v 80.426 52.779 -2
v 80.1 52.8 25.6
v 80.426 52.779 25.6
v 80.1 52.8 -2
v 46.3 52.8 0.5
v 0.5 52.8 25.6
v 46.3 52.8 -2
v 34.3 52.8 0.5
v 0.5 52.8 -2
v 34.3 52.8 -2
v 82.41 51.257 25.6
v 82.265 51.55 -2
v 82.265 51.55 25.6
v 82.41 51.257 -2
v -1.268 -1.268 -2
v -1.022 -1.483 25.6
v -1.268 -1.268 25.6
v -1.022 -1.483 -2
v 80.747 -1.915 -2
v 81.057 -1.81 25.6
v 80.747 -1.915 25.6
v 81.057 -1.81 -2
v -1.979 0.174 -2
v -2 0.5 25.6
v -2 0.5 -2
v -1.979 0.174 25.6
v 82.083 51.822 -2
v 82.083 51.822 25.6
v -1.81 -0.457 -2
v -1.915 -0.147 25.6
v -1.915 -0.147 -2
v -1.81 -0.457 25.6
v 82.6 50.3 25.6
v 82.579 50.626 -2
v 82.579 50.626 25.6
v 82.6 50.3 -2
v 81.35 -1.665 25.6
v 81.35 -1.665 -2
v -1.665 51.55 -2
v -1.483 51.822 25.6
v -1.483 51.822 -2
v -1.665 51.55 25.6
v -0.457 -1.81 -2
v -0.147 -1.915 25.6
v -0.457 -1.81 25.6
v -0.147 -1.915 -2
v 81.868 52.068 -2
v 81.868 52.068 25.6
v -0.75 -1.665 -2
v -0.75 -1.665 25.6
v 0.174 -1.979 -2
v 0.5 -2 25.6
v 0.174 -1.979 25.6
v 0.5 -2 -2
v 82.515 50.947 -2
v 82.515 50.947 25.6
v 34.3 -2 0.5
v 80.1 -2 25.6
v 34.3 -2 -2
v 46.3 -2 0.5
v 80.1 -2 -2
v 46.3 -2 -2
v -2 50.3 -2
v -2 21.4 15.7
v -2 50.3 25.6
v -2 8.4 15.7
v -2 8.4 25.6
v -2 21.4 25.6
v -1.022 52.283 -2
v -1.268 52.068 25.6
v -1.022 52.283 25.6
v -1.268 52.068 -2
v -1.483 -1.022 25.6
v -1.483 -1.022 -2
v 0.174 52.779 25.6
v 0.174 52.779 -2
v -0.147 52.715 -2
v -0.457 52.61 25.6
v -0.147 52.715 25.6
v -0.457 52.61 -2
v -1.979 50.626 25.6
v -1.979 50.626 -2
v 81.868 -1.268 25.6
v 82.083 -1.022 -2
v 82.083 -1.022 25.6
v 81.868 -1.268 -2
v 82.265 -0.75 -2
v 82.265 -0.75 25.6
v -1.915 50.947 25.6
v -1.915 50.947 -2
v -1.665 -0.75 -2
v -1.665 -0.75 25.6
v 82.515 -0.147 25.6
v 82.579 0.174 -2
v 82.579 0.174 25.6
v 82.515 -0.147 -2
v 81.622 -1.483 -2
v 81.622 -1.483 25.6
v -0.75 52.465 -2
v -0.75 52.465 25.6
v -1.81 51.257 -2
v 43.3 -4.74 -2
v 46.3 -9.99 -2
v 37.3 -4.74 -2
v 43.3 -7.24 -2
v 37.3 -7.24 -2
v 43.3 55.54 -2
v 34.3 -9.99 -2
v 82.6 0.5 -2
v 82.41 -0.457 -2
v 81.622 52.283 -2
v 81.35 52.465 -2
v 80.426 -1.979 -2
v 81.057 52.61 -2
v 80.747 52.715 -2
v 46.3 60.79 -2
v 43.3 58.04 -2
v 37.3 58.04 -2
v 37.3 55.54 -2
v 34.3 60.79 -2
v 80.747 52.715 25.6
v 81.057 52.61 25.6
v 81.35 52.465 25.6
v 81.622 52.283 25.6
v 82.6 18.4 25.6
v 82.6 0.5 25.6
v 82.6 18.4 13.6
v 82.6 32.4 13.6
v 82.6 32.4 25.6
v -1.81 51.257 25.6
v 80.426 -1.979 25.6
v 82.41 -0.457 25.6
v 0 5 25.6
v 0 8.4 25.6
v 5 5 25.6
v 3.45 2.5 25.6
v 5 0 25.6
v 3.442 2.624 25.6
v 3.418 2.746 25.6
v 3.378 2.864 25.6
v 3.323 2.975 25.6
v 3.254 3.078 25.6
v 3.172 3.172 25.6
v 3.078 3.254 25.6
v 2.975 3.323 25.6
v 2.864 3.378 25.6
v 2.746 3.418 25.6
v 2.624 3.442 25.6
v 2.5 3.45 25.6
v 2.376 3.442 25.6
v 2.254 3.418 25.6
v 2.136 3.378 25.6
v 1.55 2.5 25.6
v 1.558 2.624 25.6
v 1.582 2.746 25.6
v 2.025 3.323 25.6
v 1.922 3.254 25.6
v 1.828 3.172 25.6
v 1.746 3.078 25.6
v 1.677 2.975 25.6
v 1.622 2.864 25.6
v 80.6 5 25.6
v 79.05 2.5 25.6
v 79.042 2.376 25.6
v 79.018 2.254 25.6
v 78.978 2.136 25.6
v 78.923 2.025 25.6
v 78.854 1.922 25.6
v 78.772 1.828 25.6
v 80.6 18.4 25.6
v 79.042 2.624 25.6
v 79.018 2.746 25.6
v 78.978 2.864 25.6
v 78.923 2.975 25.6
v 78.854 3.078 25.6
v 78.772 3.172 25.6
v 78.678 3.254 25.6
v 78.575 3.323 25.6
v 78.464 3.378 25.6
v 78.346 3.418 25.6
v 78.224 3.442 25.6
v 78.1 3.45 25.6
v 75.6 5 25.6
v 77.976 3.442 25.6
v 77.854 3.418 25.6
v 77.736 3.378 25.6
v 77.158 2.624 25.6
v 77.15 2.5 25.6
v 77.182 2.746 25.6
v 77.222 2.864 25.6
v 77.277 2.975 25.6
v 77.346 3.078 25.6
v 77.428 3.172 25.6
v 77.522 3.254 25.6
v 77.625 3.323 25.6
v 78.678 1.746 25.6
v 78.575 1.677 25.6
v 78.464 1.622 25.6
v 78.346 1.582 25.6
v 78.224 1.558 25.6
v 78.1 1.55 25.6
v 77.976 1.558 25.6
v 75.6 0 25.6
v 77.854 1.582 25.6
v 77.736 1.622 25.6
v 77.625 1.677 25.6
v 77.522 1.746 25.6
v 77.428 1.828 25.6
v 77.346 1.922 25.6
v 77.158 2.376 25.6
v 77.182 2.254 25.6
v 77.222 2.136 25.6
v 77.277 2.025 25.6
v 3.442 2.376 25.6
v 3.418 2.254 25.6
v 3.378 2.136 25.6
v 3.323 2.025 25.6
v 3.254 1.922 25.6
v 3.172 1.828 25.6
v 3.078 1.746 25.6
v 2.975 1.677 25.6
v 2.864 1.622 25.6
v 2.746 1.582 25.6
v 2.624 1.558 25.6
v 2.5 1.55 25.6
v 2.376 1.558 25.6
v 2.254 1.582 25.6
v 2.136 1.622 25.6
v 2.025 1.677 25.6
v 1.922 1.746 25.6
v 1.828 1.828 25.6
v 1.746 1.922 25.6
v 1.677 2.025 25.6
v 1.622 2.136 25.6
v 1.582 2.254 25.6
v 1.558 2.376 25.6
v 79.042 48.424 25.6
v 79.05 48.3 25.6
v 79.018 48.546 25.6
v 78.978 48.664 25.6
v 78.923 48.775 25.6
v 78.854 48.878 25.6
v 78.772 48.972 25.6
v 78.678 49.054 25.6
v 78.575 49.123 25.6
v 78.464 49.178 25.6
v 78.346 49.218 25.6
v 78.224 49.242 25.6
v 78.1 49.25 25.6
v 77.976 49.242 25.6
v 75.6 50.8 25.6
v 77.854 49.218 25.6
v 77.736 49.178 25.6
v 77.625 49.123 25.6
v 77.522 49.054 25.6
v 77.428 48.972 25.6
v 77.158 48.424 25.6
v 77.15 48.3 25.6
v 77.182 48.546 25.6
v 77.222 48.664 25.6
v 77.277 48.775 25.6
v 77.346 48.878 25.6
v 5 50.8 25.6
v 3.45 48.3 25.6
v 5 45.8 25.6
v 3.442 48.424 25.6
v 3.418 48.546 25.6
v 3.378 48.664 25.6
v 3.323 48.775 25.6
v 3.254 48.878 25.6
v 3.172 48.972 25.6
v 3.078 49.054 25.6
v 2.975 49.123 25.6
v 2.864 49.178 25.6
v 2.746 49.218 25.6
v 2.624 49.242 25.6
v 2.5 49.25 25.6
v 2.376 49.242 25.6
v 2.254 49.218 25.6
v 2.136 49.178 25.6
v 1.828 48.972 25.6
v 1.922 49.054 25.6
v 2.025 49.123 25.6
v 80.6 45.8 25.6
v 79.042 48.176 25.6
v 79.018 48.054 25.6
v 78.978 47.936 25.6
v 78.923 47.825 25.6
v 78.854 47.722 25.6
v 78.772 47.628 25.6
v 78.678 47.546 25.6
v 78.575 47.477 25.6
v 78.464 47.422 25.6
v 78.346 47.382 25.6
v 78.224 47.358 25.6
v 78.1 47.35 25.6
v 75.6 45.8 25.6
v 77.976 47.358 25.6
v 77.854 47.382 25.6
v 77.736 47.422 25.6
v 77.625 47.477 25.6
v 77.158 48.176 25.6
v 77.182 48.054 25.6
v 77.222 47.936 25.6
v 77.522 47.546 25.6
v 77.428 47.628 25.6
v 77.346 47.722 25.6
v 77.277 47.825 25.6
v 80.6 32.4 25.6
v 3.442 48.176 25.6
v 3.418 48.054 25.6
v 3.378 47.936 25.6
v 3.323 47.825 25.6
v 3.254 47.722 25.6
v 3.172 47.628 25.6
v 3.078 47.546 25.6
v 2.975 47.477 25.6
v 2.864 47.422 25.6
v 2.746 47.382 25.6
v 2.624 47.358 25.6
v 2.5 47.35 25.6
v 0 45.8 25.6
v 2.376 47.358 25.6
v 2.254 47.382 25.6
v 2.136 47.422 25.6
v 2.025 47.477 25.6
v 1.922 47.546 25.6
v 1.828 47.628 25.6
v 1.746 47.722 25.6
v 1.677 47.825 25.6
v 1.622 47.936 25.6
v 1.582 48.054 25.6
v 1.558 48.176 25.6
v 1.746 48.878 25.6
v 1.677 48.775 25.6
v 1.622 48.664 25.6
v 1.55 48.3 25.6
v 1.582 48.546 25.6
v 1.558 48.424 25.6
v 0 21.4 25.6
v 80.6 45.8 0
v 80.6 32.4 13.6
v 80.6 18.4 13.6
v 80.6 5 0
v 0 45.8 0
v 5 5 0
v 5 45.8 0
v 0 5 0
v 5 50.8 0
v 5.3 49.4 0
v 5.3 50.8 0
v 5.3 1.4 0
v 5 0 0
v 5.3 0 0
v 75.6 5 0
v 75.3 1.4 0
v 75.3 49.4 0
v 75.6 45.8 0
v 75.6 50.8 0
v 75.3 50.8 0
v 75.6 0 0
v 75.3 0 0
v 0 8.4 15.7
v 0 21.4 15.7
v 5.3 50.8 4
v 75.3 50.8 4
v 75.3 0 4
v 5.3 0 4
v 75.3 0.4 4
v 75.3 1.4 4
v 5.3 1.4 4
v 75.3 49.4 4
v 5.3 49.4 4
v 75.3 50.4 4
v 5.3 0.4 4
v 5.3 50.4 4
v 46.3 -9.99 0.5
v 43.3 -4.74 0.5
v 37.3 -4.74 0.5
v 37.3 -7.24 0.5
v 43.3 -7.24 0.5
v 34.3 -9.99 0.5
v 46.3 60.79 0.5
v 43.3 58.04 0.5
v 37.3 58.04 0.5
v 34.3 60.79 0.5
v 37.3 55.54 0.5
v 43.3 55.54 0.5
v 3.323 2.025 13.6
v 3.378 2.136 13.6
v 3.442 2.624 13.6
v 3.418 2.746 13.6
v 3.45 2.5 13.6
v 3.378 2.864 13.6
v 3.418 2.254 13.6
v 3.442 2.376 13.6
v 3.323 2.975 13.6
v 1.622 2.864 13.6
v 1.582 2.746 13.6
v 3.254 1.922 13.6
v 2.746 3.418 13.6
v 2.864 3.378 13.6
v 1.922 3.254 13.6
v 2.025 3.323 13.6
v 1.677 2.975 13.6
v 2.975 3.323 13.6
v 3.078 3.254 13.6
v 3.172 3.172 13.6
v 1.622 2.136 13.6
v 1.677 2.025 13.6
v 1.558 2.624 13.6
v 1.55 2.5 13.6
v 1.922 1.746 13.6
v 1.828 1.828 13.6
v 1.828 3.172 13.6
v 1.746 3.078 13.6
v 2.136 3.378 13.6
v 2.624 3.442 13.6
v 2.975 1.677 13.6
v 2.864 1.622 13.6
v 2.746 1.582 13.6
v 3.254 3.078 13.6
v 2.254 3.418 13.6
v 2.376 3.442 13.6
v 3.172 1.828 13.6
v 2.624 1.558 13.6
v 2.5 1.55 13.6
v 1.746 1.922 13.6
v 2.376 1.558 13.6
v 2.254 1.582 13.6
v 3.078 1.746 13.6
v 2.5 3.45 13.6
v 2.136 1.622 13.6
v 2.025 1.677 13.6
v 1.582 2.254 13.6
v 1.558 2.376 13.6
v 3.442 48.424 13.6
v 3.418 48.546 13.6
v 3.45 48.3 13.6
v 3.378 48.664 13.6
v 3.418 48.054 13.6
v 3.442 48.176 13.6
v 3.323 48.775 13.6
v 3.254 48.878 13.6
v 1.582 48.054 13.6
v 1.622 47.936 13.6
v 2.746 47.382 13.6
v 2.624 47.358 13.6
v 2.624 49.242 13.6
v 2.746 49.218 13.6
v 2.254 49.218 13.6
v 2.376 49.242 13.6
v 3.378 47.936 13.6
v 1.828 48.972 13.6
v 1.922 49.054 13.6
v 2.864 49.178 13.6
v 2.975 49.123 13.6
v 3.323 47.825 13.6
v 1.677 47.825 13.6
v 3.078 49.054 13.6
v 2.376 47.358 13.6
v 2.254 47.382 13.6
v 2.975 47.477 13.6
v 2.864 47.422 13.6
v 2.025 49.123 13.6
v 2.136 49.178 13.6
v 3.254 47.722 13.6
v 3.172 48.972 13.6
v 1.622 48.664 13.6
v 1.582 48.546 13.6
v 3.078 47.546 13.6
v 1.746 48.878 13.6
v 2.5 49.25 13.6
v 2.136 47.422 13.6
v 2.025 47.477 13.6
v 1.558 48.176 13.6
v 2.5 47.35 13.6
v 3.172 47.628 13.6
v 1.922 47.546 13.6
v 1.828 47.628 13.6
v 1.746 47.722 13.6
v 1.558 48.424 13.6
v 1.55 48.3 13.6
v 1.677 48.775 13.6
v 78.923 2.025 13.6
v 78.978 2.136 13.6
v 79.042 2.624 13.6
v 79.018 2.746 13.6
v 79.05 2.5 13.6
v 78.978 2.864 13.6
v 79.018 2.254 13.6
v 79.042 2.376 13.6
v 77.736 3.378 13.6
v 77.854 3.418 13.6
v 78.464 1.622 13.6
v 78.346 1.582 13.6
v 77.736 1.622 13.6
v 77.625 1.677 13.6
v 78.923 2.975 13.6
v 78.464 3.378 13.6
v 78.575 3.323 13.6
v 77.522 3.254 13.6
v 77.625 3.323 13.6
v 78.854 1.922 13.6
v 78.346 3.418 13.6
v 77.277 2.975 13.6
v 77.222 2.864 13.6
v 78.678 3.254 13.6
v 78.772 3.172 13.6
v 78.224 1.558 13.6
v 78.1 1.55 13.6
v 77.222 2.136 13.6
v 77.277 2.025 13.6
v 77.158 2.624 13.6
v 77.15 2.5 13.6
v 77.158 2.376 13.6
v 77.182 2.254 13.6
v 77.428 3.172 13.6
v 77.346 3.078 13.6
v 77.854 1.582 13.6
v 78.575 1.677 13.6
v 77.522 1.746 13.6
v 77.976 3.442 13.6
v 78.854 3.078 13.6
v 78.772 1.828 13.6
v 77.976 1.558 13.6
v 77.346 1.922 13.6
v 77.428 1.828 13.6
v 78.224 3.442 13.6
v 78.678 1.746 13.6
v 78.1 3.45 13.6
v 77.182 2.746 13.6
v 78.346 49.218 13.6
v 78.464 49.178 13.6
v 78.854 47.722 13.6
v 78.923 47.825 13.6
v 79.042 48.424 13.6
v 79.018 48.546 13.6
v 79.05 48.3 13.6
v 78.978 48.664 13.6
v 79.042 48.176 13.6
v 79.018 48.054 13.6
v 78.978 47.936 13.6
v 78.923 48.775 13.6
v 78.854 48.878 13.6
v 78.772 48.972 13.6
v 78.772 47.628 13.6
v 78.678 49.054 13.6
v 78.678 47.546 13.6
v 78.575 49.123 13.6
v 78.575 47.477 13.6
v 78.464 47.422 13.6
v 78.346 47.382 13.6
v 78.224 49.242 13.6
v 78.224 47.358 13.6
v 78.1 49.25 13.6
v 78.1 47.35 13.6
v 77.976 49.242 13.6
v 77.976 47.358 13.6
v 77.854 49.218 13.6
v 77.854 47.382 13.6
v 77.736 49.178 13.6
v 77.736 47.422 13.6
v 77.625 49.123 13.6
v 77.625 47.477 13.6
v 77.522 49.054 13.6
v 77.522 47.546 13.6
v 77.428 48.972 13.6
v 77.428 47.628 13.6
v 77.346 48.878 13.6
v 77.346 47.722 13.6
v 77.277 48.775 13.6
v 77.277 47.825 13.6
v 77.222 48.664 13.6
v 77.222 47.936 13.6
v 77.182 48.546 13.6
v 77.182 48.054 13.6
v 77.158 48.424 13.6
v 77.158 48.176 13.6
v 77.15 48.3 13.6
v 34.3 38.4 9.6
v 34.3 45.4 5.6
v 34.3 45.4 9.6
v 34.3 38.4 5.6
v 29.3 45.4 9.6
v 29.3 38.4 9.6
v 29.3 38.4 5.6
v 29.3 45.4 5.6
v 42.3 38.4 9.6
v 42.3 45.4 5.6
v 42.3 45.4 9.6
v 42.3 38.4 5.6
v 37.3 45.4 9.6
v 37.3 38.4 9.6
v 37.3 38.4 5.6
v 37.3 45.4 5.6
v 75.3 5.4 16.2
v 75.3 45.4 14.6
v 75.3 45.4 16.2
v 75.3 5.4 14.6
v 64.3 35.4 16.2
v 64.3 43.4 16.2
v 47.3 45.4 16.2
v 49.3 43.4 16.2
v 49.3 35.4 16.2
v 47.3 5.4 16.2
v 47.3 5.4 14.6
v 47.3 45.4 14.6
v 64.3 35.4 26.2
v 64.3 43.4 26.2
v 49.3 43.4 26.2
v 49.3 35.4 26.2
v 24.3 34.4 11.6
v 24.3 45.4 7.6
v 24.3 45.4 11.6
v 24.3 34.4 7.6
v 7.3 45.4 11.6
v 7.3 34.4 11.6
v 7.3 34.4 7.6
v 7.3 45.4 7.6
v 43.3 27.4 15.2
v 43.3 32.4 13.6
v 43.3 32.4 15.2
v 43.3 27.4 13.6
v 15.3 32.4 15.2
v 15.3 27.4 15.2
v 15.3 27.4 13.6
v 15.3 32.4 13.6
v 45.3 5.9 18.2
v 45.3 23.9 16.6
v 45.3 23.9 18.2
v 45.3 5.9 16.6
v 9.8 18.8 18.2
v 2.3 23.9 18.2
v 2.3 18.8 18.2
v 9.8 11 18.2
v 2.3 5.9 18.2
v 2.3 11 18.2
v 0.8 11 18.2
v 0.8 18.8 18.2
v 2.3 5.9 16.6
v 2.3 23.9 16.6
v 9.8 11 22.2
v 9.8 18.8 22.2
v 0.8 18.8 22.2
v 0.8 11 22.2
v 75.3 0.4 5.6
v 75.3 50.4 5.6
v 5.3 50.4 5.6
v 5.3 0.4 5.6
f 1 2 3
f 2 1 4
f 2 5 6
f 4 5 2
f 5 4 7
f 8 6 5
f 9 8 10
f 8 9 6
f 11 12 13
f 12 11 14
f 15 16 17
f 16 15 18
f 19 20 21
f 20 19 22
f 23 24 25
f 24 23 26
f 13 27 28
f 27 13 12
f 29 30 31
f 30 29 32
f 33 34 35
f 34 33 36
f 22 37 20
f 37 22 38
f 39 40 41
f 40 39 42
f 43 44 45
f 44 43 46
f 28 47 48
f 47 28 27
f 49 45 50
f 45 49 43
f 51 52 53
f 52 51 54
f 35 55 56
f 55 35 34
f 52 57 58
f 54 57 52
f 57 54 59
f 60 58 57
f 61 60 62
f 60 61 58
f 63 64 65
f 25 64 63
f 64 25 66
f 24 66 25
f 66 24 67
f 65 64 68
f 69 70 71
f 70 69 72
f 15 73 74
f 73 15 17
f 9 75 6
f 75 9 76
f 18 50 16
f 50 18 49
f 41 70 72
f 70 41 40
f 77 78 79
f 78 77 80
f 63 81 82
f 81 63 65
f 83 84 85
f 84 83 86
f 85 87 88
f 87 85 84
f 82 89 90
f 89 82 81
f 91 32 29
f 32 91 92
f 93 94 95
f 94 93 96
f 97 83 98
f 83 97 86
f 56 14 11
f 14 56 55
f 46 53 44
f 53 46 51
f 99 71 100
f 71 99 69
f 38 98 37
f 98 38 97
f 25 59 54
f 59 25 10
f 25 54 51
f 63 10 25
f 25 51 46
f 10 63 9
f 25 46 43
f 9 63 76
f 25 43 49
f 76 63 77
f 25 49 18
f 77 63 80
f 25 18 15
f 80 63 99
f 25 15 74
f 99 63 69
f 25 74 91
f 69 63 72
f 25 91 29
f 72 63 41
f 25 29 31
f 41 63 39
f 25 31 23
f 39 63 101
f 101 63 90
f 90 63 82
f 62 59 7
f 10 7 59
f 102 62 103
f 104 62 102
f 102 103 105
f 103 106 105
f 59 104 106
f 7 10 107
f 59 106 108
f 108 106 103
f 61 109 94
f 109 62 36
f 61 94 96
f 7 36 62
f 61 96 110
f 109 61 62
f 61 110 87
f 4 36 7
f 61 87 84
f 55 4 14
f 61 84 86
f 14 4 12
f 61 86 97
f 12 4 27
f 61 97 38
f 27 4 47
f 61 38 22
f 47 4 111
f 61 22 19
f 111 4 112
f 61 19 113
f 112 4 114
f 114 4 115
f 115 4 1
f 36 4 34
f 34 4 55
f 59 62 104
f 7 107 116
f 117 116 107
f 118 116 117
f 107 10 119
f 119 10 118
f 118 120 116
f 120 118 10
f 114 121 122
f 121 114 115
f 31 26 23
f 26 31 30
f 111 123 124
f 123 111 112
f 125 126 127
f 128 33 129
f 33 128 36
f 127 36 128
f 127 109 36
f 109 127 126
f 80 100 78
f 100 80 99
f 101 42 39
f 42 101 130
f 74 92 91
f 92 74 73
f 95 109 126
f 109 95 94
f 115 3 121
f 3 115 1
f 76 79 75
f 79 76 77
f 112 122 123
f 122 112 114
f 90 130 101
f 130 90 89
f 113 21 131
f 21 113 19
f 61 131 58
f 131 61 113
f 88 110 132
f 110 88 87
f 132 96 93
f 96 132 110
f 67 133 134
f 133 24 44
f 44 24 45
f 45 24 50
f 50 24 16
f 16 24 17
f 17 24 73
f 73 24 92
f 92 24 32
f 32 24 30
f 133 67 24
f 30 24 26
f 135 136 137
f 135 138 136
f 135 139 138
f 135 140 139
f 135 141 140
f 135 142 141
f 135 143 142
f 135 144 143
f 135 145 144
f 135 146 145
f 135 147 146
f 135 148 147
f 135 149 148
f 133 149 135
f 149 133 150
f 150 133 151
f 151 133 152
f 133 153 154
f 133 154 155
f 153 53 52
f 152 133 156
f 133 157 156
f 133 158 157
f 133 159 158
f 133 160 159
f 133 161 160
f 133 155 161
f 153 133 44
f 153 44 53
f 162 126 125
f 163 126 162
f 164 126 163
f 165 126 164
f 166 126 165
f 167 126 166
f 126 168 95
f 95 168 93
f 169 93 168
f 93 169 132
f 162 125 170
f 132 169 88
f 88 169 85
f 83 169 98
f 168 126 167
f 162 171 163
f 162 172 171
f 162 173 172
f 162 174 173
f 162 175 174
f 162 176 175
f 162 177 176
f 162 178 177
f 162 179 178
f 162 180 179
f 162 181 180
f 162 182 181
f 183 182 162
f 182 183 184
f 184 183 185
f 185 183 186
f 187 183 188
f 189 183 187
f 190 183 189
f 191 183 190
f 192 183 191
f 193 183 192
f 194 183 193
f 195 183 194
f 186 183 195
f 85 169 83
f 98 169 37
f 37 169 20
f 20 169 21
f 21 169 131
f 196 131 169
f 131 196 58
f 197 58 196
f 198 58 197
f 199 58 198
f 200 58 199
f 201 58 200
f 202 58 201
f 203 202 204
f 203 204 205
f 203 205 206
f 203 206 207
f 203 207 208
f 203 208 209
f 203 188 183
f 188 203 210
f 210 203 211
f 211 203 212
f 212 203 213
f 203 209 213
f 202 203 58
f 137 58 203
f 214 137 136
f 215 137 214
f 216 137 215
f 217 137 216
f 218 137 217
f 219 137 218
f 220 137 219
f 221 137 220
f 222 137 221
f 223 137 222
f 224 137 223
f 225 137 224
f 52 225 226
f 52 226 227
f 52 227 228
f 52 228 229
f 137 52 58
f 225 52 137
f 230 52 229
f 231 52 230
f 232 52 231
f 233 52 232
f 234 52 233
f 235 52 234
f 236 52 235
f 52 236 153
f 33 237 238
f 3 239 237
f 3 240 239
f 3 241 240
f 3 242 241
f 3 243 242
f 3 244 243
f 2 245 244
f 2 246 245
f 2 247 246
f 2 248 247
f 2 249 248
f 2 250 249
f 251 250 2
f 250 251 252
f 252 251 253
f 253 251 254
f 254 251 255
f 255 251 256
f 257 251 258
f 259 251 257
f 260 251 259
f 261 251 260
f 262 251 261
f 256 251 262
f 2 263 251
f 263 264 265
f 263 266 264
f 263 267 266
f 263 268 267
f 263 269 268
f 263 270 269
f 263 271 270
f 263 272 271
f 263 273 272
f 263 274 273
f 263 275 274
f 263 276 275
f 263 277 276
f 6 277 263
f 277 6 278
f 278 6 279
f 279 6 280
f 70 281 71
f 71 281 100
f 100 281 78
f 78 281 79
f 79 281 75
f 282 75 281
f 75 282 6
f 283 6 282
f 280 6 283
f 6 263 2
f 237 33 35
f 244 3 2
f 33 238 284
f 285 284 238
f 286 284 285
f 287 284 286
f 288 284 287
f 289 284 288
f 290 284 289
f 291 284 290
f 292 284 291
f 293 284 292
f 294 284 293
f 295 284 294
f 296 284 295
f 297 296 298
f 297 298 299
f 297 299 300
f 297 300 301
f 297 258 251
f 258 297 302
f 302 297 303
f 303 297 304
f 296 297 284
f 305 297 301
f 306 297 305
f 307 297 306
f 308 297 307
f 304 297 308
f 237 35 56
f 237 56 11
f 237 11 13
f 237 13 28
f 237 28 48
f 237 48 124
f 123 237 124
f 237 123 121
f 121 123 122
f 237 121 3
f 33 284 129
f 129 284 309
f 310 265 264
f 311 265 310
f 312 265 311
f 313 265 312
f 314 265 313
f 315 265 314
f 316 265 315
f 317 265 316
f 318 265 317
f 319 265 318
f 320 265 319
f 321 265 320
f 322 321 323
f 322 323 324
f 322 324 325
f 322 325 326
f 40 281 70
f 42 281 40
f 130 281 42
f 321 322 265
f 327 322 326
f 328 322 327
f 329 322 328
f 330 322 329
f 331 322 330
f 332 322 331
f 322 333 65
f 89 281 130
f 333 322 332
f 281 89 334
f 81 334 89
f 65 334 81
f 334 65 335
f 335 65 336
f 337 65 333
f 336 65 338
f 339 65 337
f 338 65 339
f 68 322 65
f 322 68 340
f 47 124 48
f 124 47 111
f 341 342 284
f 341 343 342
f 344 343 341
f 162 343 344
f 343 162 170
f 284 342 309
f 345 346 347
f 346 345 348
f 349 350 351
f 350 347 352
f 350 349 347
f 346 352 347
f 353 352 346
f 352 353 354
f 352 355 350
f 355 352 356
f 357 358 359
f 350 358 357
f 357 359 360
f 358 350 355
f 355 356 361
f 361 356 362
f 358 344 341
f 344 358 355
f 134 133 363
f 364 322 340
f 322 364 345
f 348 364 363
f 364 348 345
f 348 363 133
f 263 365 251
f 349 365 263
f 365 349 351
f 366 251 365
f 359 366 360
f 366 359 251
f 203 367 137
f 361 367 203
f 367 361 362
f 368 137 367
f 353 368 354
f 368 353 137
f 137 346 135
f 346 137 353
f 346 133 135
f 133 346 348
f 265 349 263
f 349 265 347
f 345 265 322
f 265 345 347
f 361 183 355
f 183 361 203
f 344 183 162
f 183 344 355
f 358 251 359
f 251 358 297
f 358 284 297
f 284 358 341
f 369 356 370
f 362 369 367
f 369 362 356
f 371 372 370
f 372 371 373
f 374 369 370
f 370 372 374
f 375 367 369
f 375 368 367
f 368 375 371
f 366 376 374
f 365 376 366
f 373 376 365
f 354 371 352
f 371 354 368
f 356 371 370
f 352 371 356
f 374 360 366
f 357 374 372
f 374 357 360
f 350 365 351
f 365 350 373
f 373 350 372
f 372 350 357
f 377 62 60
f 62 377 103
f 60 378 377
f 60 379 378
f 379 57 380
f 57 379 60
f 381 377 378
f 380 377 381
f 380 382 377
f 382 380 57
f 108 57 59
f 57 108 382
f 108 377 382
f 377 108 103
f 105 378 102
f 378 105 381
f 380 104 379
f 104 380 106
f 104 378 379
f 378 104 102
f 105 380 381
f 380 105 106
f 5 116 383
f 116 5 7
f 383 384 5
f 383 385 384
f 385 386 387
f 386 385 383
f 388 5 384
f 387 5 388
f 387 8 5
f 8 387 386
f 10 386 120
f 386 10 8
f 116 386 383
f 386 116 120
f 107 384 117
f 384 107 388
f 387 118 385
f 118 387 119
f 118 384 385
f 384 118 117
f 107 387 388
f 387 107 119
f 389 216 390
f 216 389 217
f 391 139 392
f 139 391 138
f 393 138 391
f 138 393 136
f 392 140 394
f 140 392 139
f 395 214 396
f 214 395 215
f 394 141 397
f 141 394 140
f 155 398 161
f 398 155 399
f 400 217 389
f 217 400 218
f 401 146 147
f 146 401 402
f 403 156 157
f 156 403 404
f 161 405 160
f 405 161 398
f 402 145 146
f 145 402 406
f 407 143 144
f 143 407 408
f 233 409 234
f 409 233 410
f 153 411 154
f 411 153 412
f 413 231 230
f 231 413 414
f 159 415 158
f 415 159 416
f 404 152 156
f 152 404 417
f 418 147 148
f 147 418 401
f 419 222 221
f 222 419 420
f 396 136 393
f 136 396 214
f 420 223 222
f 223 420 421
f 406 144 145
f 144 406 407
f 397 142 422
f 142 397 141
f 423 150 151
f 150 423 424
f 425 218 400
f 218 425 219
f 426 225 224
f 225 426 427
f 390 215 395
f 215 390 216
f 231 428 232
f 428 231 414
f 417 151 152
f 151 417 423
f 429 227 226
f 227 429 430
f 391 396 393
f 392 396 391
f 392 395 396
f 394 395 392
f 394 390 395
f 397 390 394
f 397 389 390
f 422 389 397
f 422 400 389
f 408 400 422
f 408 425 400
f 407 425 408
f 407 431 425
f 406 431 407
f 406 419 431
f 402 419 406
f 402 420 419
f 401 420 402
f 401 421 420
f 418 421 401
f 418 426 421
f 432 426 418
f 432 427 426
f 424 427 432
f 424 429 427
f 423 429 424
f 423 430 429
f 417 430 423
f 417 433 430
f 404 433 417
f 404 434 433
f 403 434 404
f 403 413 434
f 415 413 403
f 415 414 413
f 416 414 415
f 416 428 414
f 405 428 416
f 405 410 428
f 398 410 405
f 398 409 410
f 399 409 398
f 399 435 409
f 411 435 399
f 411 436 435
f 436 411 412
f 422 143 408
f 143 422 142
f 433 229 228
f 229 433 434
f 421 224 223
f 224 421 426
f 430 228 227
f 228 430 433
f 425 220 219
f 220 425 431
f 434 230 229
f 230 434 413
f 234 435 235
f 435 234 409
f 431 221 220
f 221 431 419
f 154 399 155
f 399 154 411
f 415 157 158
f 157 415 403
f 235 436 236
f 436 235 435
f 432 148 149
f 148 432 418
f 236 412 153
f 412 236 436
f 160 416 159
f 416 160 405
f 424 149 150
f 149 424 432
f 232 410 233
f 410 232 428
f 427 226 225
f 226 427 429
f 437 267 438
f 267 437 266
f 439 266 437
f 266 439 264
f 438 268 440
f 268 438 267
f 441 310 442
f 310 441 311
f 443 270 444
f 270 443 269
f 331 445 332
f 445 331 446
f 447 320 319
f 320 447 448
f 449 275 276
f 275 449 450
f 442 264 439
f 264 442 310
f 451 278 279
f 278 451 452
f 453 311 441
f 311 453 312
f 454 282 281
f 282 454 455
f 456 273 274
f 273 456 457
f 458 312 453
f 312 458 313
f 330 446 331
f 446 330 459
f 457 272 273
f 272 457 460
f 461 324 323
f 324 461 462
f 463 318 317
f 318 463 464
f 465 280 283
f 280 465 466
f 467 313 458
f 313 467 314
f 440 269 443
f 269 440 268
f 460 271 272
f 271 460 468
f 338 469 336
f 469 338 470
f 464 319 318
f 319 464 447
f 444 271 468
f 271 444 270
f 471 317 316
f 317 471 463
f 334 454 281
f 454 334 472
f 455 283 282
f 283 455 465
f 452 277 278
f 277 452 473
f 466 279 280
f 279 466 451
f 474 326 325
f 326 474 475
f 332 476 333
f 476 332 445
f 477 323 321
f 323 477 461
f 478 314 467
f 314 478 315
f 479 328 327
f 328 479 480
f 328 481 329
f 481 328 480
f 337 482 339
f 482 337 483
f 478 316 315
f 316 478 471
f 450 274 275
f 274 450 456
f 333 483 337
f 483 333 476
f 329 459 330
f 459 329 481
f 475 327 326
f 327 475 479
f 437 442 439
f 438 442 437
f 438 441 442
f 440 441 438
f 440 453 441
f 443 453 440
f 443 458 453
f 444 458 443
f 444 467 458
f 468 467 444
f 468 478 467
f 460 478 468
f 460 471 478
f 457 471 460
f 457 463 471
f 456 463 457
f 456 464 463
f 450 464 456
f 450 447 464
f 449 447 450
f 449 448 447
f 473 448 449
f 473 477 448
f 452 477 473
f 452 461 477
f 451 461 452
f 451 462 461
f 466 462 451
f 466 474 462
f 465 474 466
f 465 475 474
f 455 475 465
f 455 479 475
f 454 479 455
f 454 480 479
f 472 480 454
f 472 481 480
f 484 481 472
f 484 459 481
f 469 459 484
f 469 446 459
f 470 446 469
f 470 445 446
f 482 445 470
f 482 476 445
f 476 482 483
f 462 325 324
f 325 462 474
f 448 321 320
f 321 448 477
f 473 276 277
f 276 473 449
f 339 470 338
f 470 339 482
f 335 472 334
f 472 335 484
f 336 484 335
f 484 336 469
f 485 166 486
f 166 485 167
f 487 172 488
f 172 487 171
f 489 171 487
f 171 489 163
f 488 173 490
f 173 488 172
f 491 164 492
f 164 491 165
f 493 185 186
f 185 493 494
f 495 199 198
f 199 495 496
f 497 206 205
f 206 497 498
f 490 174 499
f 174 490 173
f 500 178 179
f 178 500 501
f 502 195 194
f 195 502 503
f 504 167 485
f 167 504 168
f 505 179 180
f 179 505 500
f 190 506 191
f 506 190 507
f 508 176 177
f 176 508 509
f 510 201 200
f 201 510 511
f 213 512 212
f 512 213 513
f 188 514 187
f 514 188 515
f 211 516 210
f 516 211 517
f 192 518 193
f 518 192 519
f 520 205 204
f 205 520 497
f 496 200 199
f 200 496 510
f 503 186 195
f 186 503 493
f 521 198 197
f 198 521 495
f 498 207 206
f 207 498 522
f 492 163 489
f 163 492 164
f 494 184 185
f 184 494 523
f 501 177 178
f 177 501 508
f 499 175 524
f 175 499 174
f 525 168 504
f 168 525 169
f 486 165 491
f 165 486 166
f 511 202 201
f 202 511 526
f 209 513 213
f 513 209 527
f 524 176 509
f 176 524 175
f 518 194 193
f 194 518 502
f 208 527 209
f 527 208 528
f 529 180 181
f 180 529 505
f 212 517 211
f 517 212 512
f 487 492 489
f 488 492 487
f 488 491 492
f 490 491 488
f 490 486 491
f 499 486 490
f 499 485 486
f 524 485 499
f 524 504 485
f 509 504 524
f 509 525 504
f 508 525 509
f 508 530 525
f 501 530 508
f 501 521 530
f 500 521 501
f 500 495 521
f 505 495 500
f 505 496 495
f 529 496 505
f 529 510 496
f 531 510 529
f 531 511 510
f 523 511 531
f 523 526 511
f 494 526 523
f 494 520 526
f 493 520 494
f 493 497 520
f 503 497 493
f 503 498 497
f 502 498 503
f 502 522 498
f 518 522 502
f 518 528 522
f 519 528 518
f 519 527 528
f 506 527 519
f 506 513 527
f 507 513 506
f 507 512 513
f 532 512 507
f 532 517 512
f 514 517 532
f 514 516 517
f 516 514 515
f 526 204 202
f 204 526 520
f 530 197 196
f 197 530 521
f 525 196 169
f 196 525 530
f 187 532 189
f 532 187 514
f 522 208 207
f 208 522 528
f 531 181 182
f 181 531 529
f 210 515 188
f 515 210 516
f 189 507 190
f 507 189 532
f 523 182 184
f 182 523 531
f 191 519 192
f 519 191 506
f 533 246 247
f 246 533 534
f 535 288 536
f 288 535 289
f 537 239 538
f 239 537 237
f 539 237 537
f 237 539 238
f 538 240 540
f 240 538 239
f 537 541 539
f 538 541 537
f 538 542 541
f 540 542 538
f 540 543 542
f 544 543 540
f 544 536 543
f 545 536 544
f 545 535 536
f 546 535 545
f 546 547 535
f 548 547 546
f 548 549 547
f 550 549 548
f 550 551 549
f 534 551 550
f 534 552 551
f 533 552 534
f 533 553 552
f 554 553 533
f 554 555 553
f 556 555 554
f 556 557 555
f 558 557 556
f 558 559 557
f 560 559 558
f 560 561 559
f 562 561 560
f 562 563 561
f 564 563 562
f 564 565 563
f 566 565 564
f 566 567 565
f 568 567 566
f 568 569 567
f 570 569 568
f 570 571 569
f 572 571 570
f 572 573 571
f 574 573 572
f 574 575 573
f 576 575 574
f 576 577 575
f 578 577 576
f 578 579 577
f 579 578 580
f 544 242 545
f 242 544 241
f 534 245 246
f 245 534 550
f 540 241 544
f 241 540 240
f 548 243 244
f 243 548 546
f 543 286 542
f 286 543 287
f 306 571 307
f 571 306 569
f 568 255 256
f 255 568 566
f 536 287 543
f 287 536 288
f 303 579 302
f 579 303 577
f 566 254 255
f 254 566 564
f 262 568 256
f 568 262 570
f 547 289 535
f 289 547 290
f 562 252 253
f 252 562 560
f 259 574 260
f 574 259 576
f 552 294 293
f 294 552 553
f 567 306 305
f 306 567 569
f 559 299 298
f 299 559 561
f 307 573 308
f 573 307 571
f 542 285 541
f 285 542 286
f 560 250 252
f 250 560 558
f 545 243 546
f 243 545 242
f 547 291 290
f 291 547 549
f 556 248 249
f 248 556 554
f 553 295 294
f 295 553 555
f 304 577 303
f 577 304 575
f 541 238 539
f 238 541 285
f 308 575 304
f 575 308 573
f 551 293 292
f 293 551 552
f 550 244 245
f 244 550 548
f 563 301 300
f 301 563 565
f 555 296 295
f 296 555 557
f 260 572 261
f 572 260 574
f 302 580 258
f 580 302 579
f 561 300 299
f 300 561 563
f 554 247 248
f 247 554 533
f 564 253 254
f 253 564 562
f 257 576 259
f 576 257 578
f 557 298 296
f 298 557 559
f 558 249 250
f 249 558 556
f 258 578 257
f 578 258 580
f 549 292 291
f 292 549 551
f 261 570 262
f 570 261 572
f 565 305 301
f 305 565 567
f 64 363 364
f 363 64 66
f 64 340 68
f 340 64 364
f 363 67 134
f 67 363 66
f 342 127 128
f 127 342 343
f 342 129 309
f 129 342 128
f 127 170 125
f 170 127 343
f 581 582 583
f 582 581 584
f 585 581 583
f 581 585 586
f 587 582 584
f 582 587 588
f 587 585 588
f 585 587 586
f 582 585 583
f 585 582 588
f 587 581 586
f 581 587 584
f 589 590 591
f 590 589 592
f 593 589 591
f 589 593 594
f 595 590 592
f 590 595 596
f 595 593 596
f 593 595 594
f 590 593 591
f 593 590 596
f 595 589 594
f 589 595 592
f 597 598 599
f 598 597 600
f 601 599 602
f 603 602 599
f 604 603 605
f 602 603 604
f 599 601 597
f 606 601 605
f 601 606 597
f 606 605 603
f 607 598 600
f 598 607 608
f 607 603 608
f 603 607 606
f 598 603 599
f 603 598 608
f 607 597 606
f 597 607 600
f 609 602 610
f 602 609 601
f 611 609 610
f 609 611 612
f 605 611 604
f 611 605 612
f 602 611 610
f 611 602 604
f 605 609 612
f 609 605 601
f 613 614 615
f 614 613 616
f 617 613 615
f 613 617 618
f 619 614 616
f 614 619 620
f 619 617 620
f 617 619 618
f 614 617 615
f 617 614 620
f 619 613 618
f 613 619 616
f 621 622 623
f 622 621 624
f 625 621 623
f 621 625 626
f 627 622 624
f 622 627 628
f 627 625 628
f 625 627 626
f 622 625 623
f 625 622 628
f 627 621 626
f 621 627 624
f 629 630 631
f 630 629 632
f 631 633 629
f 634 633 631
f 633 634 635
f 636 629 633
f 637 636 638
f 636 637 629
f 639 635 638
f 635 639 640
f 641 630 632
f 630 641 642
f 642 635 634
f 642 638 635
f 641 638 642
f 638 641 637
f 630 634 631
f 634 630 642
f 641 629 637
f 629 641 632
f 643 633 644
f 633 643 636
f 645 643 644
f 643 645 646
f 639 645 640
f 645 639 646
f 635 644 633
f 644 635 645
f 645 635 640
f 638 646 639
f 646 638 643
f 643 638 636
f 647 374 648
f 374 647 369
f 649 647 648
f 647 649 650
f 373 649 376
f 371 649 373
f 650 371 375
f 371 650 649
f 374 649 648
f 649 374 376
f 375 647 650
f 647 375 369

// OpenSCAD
// Корпус адаптера PSA-CAN, два варианта (раскладка плат — в hardware/README.md):
//   full — макетная плата 50x70 мм: Arduino Nano, MCP2515, DC-DC Mini360, оптопары, X9C104;
//   lite — макетная плата 50x48 мм (5x7, обрезанная по длине): только Arduino Nano и MCP2515.
//
// Плата лежит на полках, с торцов упирается в бобышки, сверху её прижимают стойки крышки.
// Крышка крепится четырьмя саморезами 2,2x9,5 мм (или M2.5x8) в бобышки по углам.
//
// Экспорт: openscad -D "variant=\"full\"" -D "part=\"base\"" -o base-full.stl case.scad
//          (и то же для part "lid" и variant "lite")

variant = "full";  // [full, lite]
part = "assembly"; // [assembly, base, lid]
lite = variant == "lite";

/* [Плата] */
board = lite ? [48, 50, 1.6] : [70, 50, 1.6];
board_gap = 0.4;       // зазор платы до стенок
standoff = 4;          // высота под платой (пайка)
// высота над платой: full — Nano в панельках и клеммник MCP2515; lite — модули впаяны
headroom = lite ? 16 : 20;

/* [Корпус] */
wall = 2;
floor_t = 2;
lid_t = 2;
corner_r = 2.5;
boss = 5;              // сторона квадратной бобышки под саморез
screw_pilot = 1.9;     // отверстие под саморез 2,2 мм
screw_clear = 2.6;     // отверстие в крышке
screw_head = 4.8;      // потай под головку
fit = 0.25;            // зазор посадки крышки

/* [Разъём USB Nano — торец X=0] */
usb_y = lite ? 10.5 : 14.5;  // центр разъёма от края платы
// центр разъёма над платой: в панельке 11 + плата Nano 1,6 + 2; впаянная Nano — 2,5 + 1,6 + 2
usb_z = lite ? 6.1 : 14.6;
usb_w = 13;            // окно под корпус штекера mini-USB
usb_h = 9;

/* [Вывод проводов — торец X=max] */
cable_y = lite ? 35.5 : 25;  // центр от края платы
cable_z = lite ? 6 : 8;      // низ окна над платой
cable_w = lite ? 10 : 14;    // lite — только CAN-H / CAN-L
cable_h = lite ? 5 : 6;

/* [Стойки крышки, прижимающие плату: координаты от угла платы] */
post_d = 4;
post_inset = 2.5;
posts = lite
  ? [[board.x - post_inset, post_inset], [post_inset, board.y - post_inset]]
  : [for (x = [post_inset, board.x - post_inset], y = [post_inset, board.y - post_inset]) [x, y]];

/* [Крепление] */
ears = true;           // ушки под стяжки
ear = [12, 8, 2.5];
tie_slot = [6, 2.5];

/* [Вид] */
show_parts = true;     // показать платы в сборке

$fn = 48;
eps = 0.01;

// ---------- Производные размеры (начало координат — внутренний угол полости на дне) ----------
margin = boss + 0.3;                              // от торца полости до платы
inner = [board.x + 2 * margin, board.y + 2 * board_gap, standoff + board.z + headroom];
outer = [inner.x + 2 * wall, inner.y + 2 * wall];
board_pos = [margin, board_gap, standoff];        // угол платы
board_top = standoff + board.z;

function boss_centers() = [
  for (x = [boss / 2, inner.x - boss / 2], y = [boss / 2, inner.y - boss / 2]) [x, y]
];

module rounded_box(size, r) {
  hull() for (x = [r, size.x - r], y = [r, size.y - r])
    translate([x, y, 0]) cylinder(r = r, h = size.z);
}

// Вырез в торцевой стенке: от z0 (над платой) до верха стенки
module end_notch(at_max_x, y_center, width, z0) {
  x = at_max_x ? inner.x - eps : -wall - eps;
  translate([x, board_pos.y + y_center - width / 2, board_top + z0])
    cube([wall + 2 * eps, width, inner.z]);
}

module base() {
  difference() {
    union() {
      difference() {
        translate([-wall, -wall, -floor_t]) rounded_box([outer.x, outer.y, floor_t + inner.z], corner_r);
        cube([inner.x, inner.y, inner.z + eps]);
      }
      // бобышки под саморезы — они же упоры платы с торцов
      for (c = boss_centers()) translate([c.x - boss / 2, c.y - boss / 2, 0]) cube([boss, boss, inner.z]);
      // полки под длинные края платы
      for (y = [0, inner.y - 1.4]) translate([margin, y, 0]) cube([board.x, 1.4, standoff]);
      if (ears) for (side = [0, 1])
        translate([inner.x / 2 - ear.x / 2, side ? inner.y + wall - eps : -wall - ear.y + eps, -floor_t])
          difference() {
            cube(ear);
            translate([(ear.x - tie_slot.x) / 2, (ear.y - tie_slot.y) / 2, -eps])
              cube([tie_slot.x, tie_slot.y, ear.z + 2 * eps]);
          }
    }
    for (c = boss_centers()) translate([c.x, c.y, inner.z - 12]) cylinder(d = screw_pilot, h = 12 + eps);
    end_notch(false, usb_y, usb_w, usb_z - usb_h / 2);
    end_notch(true, cable_y, cable_w, cable_z);
  }
}

// Крышка в положении «на корпусе»: нижняя плоскость пластины на z = inner.z
module lid() {
  lip_h = 3;
  lip_t = 1.6;
  usb_top = usb_z + usb_h / 2;
  cable_top = cable_z + cable_h;

  difference() {
    union() {
      translate([-wall, -wall, inner.z]) rounded_box([outer.x, outer.y, lid_t], corner_r);
      // бортик вдоль длинных стенок (между бобышками)
      for (y = [fit, inner.y - fit - lip_t])
        translate([boss + fit, y, inner.z - lip_h]) cube([inner.x - 2 * (boss + fit), lip_t, lip_h + eps]);
      // стойки, прижимающие плату
      for (p = posts)
        translate([board_pos.x + p.x, board_pos.y + p.y, board_top + 0.3])
          cylinder(d = post_d, h = headroom - 0.3 + eps);
      // языки, закрывающие вырезы в торцах над окнами
      lid_tongue(false, usb_y, usb_w, usb_top);
      lid_tongue(true, cable_y, cable_w, cable_top);
    }
    for (c = boss_centers()) {
      translate([c.x, c.y, inner.z - eps]) cylinder(d = screw_clear, h = lid_t + 2 * eps);
      translate([c.x, c.y, inner.z + lid_t - 1]) cylinder(d = screw_head, h = 1 + eps);
    }
  }
}

module lid_tongue(at_max_x, y_center, width, z_top) {
  h = headroom - z_top;
  if (h > 0.6)
    translate([at_max_x ? inner.x + fit / 2 : -wall, board_pos.y + y_center - width / 2 + fit, board_top + z_top])
      cube([wall - fit / 2, width - 2 * fit, h + eps]);
}

// Условные габариты плат — только для просмотра сборки
module parts() {
  nano_z = usb_z - 3.6;  // низ платы Nano над макетной платой
  translate(board_pos) {
    color("darkgreen") cube(board);
    translate([0, 0, board.z]) {
      color("royalblue") translate([-3, usb_y - 9, nano_z]) cube([43, 18, 1.6]);       // Nano
      color("silver") translate([-4.5, usb_y - 3.9, nano_z + 1.6]) cube([9, 7.8, 4]);  // mini-USB
      if (lite) {
        color("steelblue") translate([5, 21.5, 2.5]) cube([40, 28, 1.6]);              // MCP2515
        color("seagreen") translate([37, 28, 4.1]) cube([8, 15, 10]);                  // клеммник CAN
      } else {
        color("steelblue") translate([42, 5, 9]) cube([28, 40, 1.6]);                  // MCP2515
        color("seagreen") translate([44, 35, 10.6]) cube([15, 8, 10]);                 // клеммник CAN
        color("orange") translate([2, 34, 2]) cube([17, 11, 4]);                       // Mini360
        color("purple") translate([10, 27, 8]) cube([28, 5, 1.6]);                     // X9C104 (на ребре)
        color("dimgray") for (i = [0, 1]) translate([24 + i * 8, 38, 0]) cube([5, 7, 4]); // PC817
      }
    }
  }
}

if (part == "base") {
  base();
} else if (part == "lid") {
  // для печати: пластиной вниз
  translate([0, inner.y, inner.z + lid_t]) rotate([180, 0, 0]) lid();
} else {
  base();
  if (show_parts) parts();
  %lid();
}
